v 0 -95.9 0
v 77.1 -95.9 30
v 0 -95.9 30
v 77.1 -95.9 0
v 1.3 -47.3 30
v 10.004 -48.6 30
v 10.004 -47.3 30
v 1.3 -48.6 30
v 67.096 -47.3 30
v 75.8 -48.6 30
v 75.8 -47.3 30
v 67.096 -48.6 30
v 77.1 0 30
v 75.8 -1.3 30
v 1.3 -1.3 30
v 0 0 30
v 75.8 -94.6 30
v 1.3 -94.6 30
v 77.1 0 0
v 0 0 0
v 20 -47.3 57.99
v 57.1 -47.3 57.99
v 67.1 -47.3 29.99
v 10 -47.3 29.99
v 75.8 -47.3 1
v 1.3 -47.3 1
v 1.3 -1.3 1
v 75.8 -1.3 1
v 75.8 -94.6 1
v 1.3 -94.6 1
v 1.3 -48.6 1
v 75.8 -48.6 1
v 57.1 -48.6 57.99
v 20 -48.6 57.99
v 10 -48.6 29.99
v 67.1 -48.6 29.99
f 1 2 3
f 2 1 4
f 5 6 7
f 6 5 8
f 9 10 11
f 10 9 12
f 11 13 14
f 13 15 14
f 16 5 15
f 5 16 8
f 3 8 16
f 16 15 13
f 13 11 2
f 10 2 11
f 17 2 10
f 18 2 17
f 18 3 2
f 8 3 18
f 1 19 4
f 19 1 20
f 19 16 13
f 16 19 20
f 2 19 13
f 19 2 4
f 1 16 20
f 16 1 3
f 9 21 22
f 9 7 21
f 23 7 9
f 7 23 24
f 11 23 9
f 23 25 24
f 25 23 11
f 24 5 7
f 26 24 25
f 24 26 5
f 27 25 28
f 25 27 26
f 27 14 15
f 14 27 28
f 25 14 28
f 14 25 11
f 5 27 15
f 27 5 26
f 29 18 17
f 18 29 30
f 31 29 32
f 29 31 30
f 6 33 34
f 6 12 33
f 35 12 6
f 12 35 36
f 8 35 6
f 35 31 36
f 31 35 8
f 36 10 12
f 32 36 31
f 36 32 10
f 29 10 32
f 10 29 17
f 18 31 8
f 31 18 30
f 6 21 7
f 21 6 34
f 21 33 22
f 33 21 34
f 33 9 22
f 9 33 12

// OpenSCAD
floor_thickness = 1;
wall_thickness = 1.3;
wall_height = 30; // [25:40]
tab_height = 28;

inside_length = 74.5;

/* [Hidden] */
length = inside_length + wall_thickness * 2;
width = 46 * 2 + wall_thickness * 3;
fudge = 0.1;

rotate(a=[0,0,-90]) {
union () {
difference () {
	cube([width,length,wall_height]);
	translate ([wall_thickness,wall_thickness,floor_thickness]) {
		cube([46,inside_length,wall_height]);
	}
	translate ([46 + wall_thickness*2,wall_thickness,floor_thickness]) {
		cube([46,inside_length,wall_height]);
	}
};
translate([46+wall_thickness,0,wall_height-.01])
rotate(a=[90,0,90])
linear_extrude(height = wall_thickness)
	polygon(points=[[10,0],[20,tab_height],[length - 20,tab_height],[length-10,0]]);
};

};

